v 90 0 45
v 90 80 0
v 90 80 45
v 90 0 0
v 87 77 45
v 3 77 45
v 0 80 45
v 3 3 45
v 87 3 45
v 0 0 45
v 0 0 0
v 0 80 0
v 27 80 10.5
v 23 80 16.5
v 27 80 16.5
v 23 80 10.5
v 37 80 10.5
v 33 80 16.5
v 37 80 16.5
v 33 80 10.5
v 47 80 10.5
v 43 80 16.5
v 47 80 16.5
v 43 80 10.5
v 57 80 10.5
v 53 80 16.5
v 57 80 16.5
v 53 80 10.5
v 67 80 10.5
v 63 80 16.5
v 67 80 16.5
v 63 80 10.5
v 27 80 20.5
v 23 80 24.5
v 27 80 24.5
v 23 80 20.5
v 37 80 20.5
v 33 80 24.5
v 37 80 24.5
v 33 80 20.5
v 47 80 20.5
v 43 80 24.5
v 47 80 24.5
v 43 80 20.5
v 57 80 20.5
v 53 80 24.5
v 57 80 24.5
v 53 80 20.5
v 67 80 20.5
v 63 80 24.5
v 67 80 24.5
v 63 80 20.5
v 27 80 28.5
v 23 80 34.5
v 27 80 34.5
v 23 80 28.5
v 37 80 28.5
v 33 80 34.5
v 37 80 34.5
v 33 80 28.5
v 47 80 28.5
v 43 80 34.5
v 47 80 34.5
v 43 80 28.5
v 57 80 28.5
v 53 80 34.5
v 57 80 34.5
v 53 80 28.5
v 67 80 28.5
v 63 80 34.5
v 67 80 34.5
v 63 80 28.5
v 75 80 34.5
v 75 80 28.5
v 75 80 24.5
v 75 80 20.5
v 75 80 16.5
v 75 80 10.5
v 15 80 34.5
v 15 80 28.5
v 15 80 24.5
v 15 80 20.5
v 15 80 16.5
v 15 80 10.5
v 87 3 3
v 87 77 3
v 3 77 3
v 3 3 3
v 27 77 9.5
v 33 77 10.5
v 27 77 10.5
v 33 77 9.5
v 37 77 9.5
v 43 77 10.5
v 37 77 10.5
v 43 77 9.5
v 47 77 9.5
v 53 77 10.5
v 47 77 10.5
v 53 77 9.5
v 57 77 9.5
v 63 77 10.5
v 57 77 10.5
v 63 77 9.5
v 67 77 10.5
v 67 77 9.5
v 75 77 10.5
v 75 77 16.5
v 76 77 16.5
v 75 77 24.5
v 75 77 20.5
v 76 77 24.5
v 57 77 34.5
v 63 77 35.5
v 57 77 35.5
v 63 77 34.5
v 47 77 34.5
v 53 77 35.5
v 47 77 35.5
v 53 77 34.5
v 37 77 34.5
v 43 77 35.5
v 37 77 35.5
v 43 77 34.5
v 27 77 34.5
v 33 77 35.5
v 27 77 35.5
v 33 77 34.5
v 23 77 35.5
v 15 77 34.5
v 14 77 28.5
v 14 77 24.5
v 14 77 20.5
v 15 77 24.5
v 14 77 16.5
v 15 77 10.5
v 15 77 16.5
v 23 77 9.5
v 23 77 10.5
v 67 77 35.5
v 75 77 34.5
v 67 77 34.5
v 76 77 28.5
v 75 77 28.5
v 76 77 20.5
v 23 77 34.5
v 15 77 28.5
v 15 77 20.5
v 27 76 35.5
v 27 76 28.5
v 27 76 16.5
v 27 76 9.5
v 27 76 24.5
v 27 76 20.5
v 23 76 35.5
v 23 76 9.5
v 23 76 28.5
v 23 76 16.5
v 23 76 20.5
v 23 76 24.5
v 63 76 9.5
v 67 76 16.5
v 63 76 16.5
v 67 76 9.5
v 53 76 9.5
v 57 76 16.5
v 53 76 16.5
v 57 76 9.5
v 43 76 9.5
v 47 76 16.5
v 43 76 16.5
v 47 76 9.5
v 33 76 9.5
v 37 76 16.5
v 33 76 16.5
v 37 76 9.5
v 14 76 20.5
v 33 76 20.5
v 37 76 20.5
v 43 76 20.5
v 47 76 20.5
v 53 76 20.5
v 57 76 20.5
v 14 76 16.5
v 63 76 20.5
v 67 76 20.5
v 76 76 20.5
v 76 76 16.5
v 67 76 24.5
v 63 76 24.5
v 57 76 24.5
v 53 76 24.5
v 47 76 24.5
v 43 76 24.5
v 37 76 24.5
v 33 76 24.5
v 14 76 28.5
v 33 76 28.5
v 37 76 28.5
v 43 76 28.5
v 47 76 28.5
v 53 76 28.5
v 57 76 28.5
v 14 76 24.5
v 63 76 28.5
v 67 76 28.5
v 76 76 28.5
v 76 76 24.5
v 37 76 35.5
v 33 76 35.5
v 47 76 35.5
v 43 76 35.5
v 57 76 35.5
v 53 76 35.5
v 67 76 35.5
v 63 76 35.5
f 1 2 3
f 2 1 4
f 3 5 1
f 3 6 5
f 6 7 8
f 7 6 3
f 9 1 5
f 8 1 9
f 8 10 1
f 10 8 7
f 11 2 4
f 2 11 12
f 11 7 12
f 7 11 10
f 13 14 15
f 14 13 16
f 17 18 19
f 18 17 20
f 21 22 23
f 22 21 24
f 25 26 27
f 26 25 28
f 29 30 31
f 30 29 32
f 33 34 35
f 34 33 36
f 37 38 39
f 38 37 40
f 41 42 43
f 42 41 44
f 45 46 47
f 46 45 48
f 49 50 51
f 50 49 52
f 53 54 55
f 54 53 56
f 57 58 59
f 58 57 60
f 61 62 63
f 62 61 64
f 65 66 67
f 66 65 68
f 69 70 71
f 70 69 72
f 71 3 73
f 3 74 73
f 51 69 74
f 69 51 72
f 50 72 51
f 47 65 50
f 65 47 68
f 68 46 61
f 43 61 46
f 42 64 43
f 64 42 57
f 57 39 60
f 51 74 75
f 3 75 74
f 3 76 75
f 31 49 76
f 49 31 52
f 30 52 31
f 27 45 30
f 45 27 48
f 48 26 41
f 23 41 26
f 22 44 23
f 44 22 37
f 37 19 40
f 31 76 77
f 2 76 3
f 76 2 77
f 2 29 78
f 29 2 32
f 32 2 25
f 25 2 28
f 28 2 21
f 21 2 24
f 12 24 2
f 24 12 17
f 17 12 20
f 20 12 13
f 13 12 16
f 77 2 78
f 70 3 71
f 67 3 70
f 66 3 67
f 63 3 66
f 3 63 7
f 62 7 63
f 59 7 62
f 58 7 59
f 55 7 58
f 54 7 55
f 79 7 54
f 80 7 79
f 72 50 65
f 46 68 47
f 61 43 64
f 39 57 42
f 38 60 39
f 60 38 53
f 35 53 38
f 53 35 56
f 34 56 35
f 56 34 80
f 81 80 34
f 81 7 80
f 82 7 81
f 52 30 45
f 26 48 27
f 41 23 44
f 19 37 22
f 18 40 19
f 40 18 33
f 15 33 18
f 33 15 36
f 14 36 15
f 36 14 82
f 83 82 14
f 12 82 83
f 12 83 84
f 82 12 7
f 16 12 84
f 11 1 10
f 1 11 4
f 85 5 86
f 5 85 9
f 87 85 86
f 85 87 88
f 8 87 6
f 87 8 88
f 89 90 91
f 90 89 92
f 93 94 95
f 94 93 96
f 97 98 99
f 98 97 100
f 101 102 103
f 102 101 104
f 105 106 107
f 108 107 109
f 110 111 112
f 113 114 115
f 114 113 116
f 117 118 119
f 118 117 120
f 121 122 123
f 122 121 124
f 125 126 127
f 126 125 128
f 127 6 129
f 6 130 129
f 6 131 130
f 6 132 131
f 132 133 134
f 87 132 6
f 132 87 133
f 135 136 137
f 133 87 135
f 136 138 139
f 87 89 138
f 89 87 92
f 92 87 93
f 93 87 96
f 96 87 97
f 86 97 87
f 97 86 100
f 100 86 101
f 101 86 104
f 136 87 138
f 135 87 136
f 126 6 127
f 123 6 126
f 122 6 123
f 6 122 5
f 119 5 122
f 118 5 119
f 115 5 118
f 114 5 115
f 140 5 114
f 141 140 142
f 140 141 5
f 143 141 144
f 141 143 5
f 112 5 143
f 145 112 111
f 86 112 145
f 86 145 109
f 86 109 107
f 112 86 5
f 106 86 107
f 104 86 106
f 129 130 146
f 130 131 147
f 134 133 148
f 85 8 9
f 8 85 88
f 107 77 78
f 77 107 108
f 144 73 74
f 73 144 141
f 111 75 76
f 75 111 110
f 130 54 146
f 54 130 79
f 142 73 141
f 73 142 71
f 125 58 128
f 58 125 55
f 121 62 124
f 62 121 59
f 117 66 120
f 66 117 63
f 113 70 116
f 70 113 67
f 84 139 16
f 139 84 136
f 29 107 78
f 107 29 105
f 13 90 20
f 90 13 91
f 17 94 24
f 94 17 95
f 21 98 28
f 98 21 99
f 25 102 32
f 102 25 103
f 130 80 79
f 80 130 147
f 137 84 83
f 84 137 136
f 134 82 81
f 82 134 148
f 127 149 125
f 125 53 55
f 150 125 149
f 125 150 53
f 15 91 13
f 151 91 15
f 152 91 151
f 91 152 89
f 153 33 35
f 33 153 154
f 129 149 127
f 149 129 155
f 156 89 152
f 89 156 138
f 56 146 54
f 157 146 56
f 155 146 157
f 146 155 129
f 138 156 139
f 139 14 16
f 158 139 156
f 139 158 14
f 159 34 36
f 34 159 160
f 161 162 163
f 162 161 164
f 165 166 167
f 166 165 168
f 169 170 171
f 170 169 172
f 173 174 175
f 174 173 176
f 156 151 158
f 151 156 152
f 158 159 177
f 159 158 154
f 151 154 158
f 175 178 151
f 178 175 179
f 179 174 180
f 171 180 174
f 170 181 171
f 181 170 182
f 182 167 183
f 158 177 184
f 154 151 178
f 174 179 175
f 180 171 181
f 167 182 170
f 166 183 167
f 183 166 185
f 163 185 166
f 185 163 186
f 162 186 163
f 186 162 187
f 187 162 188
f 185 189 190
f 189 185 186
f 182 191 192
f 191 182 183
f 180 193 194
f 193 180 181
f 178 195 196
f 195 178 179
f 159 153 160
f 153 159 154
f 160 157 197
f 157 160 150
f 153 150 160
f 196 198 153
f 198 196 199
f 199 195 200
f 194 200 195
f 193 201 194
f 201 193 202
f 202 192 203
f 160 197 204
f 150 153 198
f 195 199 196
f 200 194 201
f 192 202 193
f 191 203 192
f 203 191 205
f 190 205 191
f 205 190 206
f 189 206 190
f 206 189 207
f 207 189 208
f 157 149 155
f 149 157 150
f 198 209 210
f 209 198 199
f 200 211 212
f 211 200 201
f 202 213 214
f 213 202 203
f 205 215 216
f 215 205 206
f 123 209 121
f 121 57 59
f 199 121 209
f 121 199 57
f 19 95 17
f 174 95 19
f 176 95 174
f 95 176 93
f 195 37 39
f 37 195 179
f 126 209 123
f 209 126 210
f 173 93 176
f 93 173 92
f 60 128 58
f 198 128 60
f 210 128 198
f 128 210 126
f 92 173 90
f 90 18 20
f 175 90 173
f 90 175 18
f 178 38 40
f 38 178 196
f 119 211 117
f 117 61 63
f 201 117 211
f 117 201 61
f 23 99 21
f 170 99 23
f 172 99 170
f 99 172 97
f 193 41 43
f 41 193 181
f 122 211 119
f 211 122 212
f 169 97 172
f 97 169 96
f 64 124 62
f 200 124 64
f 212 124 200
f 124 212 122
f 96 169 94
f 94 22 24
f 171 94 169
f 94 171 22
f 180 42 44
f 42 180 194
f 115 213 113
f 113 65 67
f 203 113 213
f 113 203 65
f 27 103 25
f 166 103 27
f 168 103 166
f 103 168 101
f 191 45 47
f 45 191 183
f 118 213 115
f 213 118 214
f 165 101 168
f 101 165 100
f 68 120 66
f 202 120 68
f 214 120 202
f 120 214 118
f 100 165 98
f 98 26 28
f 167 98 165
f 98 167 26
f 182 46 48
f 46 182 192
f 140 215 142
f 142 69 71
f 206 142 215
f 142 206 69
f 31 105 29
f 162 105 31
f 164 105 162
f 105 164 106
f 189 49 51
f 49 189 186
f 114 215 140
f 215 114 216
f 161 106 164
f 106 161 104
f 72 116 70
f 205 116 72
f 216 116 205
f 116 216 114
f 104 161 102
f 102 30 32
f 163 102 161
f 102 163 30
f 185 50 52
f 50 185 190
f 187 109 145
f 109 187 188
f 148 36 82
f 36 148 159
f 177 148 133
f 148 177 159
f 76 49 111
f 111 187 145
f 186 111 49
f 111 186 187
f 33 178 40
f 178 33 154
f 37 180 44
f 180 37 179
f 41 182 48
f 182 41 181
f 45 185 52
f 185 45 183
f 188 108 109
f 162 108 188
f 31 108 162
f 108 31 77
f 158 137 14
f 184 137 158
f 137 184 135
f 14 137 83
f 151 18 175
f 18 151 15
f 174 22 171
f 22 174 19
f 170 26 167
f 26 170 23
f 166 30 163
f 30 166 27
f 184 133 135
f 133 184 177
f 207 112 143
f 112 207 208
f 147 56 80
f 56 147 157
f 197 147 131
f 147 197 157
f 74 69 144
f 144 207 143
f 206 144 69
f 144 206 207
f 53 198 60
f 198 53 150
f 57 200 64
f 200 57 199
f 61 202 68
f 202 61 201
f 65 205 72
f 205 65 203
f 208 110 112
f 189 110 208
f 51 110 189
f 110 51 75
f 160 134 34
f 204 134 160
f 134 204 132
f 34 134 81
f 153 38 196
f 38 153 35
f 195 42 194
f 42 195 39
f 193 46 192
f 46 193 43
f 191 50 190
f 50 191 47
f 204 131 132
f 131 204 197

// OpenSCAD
$fn = 32;

// ----------------------------------------------------------------------
// Vent box: crossgrid enclosure
// ----------------------------------------------------------------------

// --- parameters (mm) ---
box_l = 90;               // box length, X
box_w = 80;               // box width, Y
box_h = 45;               // box height, Z
wall_t = 3;               // shell wall thickness
win_l = 60;               // vent window width, X
win_h = 24;               // vent window height, Z
bar_w = 4;                // grid bar width
n_v = 5;                  // vertical bar count
n_h = 2;                  // horizontal bar count

win_z0 = (box_h - win_h) / 2;  // window lower edge Z
v_step = win_l / (n_v + 1);  // vertical bar step
h_step = win_h / (n_h + 1);  // horizontal bar step

difference() {
  union() {
    difference() {
      cube([box_l, box_w, box_h]);
  translate([wall_t, wall_t, wall_t])
    cube([box_l - 2 * wall_t, box_w - 2 * wall_t, box_h]);
  translate([(box_l - win_l) / 2, box_w - wall_t - 1, win_z0])
    cube([win_l, wall_t + 2, win_h]);
    }
    for (i = [1 : n_v])
      translate([(box_l - win_l) / 2 + i * v_step - bar_w / 2,
                 box_w - wall_t - 1, win_z0 - 1])
        cube([bar_w, wall_t + 1, win_h + 2]);
    for (i = [1 : n_h])
      translate([(box_l - win_l) / 2 - 1, box_w - wall_t - 1,
                 win_z0 + i * h_step - bar_w / 2])
        cube([win_l + 2, wall_t + 1, bar_w]);
  }
}
